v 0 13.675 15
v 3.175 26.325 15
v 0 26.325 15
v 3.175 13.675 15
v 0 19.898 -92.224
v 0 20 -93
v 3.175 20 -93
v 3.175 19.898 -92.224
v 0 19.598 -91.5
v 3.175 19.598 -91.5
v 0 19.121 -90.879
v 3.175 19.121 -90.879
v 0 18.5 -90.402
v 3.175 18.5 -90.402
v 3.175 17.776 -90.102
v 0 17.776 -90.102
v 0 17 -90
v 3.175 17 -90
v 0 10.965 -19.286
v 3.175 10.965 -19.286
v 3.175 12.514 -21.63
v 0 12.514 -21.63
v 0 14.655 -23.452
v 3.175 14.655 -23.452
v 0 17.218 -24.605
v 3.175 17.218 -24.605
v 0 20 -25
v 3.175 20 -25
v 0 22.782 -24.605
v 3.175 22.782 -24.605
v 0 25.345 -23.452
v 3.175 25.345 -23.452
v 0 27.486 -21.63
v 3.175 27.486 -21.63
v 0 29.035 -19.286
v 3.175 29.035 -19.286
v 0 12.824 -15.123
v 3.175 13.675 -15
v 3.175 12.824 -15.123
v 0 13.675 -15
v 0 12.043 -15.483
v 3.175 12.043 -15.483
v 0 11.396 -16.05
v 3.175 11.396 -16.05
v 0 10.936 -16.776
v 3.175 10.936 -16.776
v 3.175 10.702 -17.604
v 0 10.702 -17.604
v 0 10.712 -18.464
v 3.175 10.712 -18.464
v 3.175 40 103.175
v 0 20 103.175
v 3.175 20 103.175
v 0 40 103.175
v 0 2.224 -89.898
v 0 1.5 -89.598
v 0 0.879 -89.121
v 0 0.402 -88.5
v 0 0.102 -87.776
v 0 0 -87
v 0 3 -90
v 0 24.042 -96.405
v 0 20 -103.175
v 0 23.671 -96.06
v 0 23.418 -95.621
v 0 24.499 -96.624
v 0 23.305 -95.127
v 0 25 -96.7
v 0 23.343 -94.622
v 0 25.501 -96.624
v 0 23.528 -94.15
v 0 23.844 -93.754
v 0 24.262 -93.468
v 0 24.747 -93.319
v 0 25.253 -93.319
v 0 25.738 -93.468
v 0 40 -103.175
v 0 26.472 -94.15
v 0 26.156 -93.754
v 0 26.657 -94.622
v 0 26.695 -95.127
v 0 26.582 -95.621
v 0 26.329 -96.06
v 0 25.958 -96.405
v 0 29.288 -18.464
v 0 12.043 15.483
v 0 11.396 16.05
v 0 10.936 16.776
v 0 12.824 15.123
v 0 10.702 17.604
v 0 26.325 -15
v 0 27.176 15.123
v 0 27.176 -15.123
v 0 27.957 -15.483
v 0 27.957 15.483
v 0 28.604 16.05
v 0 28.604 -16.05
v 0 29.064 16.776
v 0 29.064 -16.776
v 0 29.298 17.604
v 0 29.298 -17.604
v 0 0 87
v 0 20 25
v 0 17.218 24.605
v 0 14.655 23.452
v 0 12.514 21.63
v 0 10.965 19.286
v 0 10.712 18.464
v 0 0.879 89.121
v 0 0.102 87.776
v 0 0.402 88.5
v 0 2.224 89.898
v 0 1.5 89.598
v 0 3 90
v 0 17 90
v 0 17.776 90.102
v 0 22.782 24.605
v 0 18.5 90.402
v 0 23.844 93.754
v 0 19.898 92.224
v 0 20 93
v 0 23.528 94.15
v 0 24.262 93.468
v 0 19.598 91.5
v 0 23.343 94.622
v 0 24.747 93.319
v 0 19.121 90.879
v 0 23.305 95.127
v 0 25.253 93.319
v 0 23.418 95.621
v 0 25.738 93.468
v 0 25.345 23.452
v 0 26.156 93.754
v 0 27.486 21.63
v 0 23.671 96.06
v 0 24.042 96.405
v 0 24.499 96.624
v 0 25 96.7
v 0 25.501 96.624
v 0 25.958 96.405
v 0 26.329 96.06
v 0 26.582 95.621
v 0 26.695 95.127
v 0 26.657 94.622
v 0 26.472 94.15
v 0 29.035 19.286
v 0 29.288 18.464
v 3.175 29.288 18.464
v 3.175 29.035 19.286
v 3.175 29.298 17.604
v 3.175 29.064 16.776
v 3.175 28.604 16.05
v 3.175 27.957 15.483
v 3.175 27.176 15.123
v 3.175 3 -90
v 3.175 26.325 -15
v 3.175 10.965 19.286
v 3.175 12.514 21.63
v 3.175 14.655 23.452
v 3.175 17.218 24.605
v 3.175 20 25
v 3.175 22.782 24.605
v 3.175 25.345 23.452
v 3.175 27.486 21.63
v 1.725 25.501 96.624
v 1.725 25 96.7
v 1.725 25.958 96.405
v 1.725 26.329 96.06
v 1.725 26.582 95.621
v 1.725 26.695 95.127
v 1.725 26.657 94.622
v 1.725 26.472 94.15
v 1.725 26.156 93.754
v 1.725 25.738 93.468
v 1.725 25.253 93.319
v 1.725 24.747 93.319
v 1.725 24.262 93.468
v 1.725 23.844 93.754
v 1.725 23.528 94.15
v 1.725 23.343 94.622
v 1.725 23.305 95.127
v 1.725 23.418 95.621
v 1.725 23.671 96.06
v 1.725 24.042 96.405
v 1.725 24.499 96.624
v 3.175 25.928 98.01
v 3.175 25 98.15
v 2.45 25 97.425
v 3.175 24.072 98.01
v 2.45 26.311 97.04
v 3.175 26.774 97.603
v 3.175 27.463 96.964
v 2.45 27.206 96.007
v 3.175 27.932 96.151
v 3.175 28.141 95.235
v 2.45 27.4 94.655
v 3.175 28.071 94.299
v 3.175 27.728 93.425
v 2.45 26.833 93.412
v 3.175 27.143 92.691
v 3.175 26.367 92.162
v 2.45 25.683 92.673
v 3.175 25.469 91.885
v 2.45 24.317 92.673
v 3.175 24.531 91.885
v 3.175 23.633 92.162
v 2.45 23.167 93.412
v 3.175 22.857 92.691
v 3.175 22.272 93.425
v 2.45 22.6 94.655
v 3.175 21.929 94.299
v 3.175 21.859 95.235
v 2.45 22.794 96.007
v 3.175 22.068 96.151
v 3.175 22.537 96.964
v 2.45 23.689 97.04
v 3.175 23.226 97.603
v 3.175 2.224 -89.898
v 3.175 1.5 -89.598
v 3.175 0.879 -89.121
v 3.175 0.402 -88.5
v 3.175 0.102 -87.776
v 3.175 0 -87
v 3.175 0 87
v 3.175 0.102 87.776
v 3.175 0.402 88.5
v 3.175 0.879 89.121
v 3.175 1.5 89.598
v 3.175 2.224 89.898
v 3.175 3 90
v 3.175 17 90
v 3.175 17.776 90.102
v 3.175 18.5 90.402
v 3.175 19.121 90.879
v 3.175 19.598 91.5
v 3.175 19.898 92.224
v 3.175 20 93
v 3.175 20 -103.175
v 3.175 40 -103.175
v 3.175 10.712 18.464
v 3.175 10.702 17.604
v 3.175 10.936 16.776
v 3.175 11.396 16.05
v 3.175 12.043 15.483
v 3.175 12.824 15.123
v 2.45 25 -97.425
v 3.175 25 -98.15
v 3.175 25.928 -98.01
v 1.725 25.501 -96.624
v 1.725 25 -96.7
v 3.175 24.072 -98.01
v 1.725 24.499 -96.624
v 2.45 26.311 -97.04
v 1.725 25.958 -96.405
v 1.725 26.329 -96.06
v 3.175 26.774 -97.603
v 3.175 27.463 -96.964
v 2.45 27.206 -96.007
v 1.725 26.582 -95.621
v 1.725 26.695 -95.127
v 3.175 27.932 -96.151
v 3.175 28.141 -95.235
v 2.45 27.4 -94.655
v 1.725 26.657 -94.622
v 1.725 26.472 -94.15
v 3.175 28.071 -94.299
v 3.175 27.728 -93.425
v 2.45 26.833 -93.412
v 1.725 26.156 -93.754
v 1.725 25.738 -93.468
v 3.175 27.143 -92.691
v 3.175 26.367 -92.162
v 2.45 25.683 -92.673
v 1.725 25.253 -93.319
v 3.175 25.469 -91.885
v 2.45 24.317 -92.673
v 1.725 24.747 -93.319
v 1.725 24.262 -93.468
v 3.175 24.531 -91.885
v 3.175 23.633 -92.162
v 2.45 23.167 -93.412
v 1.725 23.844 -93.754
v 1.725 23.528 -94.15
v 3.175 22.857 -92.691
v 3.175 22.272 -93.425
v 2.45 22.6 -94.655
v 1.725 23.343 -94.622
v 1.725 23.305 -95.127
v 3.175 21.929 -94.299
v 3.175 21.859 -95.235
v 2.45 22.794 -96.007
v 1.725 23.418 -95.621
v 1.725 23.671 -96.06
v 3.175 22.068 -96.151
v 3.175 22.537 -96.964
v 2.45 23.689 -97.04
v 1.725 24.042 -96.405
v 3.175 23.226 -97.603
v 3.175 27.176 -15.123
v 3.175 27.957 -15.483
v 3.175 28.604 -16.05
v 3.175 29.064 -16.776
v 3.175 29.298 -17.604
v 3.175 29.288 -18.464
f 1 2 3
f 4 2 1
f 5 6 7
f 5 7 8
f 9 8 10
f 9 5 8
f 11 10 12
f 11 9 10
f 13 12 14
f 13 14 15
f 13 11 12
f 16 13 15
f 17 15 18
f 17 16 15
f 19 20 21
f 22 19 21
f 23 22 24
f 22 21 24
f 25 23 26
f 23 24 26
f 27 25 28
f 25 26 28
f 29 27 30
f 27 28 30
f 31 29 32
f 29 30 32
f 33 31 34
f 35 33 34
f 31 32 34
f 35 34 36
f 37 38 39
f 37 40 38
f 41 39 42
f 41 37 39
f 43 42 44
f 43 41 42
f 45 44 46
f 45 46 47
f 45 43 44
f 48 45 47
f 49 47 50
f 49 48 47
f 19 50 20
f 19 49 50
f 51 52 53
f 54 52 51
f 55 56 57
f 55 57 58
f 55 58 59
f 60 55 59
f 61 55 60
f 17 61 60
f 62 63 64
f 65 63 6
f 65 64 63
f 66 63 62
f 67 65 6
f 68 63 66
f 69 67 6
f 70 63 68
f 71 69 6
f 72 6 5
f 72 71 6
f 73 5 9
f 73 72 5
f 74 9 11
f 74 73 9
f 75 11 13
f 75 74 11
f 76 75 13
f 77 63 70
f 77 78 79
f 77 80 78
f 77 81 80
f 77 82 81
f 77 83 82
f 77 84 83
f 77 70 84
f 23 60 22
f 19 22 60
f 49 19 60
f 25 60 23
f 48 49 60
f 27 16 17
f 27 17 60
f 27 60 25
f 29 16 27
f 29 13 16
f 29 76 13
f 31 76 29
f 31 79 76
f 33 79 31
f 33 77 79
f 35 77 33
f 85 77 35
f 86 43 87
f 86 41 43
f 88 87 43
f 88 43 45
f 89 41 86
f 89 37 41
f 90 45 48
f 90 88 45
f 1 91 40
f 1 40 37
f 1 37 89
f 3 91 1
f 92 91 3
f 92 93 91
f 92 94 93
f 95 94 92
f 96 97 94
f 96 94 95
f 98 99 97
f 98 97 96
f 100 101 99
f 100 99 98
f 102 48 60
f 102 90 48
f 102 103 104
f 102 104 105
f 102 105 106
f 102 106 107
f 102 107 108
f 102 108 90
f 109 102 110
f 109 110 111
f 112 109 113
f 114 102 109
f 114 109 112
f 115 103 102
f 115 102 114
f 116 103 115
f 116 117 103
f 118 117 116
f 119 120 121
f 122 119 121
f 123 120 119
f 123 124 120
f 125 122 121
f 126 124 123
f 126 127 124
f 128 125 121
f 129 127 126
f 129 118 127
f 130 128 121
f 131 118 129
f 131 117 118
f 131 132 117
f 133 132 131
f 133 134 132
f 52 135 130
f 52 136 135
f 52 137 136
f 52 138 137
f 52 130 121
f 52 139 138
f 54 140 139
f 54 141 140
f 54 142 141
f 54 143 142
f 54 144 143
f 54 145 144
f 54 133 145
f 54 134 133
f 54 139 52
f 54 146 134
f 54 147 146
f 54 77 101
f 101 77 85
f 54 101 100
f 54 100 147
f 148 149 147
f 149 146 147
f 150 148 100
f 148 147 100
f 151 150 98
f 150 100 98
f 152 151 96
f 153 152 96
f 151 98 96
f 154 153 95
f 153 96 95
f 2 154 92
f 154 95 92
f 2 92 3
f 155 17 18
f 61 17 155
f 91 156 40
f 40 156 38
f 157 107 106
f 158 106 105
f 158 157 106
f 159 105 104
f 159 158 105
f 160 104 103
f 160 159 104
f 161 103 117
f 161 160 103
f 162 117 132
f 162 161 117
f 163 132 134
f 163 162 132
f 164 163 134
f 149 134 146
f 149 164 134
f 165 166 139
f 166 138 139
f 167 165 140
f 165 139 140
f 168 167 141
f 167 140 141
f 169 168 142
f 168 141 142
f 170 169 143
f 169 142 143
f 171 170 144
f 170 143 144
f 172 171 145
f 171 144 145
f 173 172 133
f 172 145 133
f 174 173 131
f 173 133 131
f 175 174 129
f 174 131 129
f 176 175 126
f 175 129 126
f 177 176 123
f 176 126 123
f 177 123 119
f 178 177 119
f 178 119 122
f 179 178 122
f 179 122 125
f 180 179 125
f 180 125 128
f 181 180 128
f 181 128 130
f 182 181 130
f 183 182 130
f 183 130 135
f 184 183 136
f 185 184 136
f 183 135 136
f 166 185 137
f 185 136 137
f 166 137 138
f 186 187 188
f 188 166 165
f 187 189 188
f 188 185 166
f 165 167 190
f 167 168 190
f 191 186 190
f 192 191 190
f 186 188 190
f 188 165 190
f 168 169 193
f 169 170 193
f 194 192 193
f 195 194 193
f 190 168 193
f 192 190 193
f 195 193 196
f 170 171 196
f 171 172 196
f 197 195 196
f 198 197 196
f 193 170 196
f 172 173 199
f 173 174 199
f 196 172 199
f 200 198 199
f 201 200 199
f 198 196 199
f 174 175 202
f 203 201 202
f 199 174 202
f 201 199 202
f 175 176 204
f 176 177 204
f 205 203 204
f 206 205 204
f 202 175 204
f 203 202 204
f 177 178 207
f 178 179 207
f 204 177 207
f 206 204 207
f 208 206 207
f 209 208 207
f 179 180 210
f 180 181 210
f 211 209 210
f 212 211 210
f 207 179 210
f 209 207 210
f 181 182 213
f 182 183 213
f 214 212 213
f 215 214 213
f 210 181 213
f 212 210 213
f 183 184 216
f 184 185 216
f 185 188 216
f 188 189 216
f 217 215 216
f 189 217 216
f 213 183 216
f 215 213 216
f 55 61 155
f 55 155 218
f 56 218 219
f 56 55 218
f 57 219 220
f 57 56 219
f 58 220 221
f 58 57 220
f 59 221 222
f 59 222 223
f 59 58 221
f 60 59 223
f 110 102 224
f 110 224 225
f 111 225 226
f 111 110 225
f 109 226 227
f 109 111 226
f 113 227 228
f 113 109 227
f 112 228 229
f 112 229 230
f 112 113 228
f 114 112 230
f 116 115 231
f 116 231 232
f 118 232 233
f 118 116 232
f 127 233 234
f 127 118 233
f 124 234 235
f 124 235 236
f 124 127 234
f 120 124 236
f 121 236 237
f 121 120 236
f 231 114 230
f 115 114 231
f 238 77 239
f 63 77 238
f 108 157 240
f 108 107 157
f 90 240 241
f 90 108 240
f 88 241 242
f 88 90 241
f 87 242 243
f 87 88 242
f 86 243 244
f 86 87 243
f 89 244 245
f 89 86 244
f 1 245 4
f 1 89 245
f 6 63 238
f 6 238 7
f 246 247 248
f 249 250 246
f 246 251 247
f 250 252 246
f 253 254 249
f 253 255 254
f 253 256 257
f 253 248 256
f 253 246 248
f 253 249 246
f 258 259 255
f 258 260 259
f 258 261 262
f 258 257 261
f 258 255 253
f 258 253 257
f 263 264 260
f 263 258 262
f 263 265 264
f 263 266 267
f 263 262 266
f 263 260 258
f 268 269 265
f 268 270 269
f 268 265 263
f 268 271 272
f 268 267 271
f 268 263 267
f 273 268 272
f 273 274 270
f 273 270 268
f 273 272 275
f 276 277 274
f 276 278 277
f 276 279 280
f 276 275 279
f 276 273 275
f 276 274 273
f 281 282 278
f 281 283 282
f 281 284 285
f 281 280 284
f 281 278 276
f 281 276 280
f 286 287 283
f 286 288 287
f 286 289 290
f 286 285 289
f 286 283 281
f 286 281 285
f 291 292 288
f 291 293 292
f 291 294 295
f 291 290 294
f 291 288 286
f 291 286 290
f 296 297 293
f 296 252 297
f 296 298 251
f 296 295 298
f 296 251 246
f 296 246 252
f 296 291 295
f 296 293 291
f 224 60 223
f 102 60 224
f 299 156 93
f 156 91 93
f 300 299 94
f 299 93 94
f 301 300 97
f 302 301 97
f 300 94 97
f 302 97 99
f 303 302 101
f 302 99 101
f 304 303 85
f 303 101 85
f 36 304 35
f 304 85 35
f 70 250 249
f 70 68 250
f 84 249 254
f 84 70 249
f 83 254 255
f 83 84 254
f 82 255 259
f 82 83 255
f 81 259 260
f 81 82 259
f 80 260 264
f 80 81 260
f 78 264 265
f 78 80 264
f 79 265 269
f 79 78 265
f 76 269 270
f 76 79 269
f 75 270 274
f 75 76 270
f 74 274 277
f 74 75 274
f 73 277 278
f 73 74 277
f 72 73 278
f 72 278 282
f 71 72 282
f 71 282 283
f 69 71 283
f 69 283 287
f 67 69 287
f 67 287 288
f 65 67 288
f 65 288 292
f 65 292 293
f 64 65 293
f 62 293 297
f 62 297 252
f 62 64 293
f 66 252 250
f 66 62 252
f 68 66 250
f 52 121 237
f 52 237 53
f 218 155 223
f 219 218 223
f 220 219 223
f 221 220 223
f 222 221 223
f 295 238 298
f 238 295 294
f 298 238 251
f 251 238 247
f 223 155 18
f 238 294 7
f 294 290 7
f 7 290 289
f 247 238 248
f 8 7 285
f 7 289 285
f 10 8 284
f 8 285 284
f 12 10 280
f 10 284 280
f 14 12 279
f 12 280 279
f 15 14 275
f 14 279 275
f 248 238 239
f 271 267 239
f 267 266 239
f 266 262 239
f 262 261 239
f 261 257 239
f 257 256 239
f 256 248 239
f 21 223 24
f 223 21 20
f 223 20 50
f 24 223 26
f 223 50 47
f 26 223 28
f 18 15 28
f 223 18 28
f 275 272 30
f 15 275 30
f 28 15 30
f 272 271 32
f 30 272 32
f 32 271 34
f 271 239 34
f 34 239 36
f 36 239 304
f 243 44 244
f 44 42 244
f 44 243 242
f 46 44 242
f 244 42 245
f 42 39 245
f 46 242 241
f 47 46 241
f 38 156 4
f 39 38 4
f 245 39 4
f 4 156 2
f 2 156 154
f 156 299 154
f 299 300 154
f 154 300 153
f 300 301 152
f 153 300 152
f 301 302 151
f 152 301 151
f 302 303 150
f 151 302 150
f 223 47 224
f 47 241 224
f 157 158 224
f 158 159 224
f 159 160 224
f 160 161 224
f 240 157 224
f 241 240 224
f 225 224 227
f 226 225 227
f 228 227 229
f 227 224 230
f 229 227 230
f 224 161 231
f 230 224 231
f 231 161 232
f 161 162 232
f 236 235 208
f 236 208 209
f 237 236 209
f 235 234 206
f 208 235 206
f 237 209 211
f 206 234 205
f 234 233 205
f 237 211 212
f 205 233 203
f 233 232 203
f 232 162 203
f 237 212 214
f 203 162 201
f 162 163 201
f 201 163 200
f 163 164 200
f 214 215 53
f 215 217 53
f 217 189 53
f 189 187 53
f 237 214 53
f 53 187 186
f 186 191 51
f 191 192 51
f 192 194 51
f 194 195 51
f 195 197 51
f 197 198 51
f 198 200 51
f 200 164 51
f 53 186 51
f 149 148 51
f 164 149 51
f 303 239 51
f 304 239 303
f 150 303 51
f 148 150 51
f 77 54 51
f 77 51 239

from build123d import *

# Parameters (mm, degrees)
BOSS_EXTRUDE1_DEPTH                             = 3.175
CSK_FOR_M3_FLAT_HEAD_MACHINE_SCREW1_D           = 3.4
CSK_FOR_M3_FLAT_HEAD_MACHINE_SCREW1_CSINK_D     = 6.3
CSK_FOR_M3_FLAT_HEAD_MACHINE_SCREW1_CSINK_ANGLE = 90
CUT_EXTRUDE1_DEPTH                              = 4.175
FILLET1_R                                       = 3
FILLET1_OF_MIRROR3_R                            = 3


with BuildPart() as part:
    # Sketch1 → Boss-Extrude1 (new body)
    with BuildSketch(Plane(origin=(0, 0, 0), x_dir=(0, 0, -1), z_dir=(1, 0, 0))):
        with BuildLine():
            Line((-103.175, 20), (-103.175, 40))
            Line((-103.175, 40), (103.175, 40))
            Line((103.175, 40), (103.175, 20))
            Line((103.175, 20), (93, 20))
            ThreePointArc((93, 20), (90.878679656, 19.121320344), (90, 17))
            Line((90, 17), (90, 3))
            ThreePointArc((90, 3), (89.121320344, 0.878679656), (87, 0))
            Line((87, 0), (-87, 0))
            ThreePointArc((-87, 0), (-89.121320344, 0.878679656), (-90, 3))
            Line((-90, 3), (-90, 17))
            ThreePointArc((-90, 17), (-90.878679656, 19.121320344), (-93, 20))
            Line((-93, 20), (-103.175, 20))
        make_face()
    extrude(amount=BOSS_EXTRUDE1_DEPTH)

    # CSK for M3 Flat Head Machine Screw1 (through all)
    with Locations(Plane(origin=(3.175, 0, 0), x_dir=(0, 0, -1), z_dir=(1, 0, 0))):
        with Locations((-95, 25)):
            csk_for_m3_flat_head_machine_screw1 = CounterSinkHole(CSK_FOR_M3_FLAT_HEAD_MACHINE_SCREW1_D / 2, CSK_FOR_M3_FLAT_HEAD_MACHINE_SCREW1_CSINK_D / 2, counter_sink_angle=CSK_FOR_M3_FLAT_HEAD_MACHINE_SCREW1_CSINK_ANGLE)

    # Mirror1: CSK for M3 Flat Head Machine Screw1 across plane
    add(csk_for_m3_flat_head_machine_screw1.mirror(Plane.XY), mode=Mode.SUBTRACT)

    # Sketch4 → Cut-Extrude1 (cut, through all)
    with BuildSketch(Plane(origin=(3.175, 0, 0), x_dir=(0, 0, -1), z_dir=(1, 0, 0))):
        with BuildLine():
            Line((-15, 30), (-15, 10))
            ThreePointArc((-15, 10), (-25, 20), (-15, 30))
        make_face()
    cut_extrude1 = extrude(amount=-CUT_EXTRUDE1_DEPTH, mode=Mode.SUBTRACT)

    # Fillet1
    fillet1_edges = [part.edges().sort_by_distance(p)[0] for p in [
        (1.5875, 10, 15),
        (1.5875, 30, 15),
    ]]
    fillet(fillet1_edges, radius=FILLET1_R)

    # Mirror3: Cut-Extrude1 across plane
    add(cut_extrude1.mirror(Plane.XY), mode=Mode.SUBTRACT)

    # Fillet1 of Mirror3
    fillet1_of_mirror3_edges = [part.edges().sort_by_distance(p)[0] for p in [
        (1.5875, 10, -15),
        (1.5875, 30, -15),
    ]]
    fillet(fillet1_of_mirror3_edges, radius=FILLET1_OF_MIRROR3_R)


solid = part.part
